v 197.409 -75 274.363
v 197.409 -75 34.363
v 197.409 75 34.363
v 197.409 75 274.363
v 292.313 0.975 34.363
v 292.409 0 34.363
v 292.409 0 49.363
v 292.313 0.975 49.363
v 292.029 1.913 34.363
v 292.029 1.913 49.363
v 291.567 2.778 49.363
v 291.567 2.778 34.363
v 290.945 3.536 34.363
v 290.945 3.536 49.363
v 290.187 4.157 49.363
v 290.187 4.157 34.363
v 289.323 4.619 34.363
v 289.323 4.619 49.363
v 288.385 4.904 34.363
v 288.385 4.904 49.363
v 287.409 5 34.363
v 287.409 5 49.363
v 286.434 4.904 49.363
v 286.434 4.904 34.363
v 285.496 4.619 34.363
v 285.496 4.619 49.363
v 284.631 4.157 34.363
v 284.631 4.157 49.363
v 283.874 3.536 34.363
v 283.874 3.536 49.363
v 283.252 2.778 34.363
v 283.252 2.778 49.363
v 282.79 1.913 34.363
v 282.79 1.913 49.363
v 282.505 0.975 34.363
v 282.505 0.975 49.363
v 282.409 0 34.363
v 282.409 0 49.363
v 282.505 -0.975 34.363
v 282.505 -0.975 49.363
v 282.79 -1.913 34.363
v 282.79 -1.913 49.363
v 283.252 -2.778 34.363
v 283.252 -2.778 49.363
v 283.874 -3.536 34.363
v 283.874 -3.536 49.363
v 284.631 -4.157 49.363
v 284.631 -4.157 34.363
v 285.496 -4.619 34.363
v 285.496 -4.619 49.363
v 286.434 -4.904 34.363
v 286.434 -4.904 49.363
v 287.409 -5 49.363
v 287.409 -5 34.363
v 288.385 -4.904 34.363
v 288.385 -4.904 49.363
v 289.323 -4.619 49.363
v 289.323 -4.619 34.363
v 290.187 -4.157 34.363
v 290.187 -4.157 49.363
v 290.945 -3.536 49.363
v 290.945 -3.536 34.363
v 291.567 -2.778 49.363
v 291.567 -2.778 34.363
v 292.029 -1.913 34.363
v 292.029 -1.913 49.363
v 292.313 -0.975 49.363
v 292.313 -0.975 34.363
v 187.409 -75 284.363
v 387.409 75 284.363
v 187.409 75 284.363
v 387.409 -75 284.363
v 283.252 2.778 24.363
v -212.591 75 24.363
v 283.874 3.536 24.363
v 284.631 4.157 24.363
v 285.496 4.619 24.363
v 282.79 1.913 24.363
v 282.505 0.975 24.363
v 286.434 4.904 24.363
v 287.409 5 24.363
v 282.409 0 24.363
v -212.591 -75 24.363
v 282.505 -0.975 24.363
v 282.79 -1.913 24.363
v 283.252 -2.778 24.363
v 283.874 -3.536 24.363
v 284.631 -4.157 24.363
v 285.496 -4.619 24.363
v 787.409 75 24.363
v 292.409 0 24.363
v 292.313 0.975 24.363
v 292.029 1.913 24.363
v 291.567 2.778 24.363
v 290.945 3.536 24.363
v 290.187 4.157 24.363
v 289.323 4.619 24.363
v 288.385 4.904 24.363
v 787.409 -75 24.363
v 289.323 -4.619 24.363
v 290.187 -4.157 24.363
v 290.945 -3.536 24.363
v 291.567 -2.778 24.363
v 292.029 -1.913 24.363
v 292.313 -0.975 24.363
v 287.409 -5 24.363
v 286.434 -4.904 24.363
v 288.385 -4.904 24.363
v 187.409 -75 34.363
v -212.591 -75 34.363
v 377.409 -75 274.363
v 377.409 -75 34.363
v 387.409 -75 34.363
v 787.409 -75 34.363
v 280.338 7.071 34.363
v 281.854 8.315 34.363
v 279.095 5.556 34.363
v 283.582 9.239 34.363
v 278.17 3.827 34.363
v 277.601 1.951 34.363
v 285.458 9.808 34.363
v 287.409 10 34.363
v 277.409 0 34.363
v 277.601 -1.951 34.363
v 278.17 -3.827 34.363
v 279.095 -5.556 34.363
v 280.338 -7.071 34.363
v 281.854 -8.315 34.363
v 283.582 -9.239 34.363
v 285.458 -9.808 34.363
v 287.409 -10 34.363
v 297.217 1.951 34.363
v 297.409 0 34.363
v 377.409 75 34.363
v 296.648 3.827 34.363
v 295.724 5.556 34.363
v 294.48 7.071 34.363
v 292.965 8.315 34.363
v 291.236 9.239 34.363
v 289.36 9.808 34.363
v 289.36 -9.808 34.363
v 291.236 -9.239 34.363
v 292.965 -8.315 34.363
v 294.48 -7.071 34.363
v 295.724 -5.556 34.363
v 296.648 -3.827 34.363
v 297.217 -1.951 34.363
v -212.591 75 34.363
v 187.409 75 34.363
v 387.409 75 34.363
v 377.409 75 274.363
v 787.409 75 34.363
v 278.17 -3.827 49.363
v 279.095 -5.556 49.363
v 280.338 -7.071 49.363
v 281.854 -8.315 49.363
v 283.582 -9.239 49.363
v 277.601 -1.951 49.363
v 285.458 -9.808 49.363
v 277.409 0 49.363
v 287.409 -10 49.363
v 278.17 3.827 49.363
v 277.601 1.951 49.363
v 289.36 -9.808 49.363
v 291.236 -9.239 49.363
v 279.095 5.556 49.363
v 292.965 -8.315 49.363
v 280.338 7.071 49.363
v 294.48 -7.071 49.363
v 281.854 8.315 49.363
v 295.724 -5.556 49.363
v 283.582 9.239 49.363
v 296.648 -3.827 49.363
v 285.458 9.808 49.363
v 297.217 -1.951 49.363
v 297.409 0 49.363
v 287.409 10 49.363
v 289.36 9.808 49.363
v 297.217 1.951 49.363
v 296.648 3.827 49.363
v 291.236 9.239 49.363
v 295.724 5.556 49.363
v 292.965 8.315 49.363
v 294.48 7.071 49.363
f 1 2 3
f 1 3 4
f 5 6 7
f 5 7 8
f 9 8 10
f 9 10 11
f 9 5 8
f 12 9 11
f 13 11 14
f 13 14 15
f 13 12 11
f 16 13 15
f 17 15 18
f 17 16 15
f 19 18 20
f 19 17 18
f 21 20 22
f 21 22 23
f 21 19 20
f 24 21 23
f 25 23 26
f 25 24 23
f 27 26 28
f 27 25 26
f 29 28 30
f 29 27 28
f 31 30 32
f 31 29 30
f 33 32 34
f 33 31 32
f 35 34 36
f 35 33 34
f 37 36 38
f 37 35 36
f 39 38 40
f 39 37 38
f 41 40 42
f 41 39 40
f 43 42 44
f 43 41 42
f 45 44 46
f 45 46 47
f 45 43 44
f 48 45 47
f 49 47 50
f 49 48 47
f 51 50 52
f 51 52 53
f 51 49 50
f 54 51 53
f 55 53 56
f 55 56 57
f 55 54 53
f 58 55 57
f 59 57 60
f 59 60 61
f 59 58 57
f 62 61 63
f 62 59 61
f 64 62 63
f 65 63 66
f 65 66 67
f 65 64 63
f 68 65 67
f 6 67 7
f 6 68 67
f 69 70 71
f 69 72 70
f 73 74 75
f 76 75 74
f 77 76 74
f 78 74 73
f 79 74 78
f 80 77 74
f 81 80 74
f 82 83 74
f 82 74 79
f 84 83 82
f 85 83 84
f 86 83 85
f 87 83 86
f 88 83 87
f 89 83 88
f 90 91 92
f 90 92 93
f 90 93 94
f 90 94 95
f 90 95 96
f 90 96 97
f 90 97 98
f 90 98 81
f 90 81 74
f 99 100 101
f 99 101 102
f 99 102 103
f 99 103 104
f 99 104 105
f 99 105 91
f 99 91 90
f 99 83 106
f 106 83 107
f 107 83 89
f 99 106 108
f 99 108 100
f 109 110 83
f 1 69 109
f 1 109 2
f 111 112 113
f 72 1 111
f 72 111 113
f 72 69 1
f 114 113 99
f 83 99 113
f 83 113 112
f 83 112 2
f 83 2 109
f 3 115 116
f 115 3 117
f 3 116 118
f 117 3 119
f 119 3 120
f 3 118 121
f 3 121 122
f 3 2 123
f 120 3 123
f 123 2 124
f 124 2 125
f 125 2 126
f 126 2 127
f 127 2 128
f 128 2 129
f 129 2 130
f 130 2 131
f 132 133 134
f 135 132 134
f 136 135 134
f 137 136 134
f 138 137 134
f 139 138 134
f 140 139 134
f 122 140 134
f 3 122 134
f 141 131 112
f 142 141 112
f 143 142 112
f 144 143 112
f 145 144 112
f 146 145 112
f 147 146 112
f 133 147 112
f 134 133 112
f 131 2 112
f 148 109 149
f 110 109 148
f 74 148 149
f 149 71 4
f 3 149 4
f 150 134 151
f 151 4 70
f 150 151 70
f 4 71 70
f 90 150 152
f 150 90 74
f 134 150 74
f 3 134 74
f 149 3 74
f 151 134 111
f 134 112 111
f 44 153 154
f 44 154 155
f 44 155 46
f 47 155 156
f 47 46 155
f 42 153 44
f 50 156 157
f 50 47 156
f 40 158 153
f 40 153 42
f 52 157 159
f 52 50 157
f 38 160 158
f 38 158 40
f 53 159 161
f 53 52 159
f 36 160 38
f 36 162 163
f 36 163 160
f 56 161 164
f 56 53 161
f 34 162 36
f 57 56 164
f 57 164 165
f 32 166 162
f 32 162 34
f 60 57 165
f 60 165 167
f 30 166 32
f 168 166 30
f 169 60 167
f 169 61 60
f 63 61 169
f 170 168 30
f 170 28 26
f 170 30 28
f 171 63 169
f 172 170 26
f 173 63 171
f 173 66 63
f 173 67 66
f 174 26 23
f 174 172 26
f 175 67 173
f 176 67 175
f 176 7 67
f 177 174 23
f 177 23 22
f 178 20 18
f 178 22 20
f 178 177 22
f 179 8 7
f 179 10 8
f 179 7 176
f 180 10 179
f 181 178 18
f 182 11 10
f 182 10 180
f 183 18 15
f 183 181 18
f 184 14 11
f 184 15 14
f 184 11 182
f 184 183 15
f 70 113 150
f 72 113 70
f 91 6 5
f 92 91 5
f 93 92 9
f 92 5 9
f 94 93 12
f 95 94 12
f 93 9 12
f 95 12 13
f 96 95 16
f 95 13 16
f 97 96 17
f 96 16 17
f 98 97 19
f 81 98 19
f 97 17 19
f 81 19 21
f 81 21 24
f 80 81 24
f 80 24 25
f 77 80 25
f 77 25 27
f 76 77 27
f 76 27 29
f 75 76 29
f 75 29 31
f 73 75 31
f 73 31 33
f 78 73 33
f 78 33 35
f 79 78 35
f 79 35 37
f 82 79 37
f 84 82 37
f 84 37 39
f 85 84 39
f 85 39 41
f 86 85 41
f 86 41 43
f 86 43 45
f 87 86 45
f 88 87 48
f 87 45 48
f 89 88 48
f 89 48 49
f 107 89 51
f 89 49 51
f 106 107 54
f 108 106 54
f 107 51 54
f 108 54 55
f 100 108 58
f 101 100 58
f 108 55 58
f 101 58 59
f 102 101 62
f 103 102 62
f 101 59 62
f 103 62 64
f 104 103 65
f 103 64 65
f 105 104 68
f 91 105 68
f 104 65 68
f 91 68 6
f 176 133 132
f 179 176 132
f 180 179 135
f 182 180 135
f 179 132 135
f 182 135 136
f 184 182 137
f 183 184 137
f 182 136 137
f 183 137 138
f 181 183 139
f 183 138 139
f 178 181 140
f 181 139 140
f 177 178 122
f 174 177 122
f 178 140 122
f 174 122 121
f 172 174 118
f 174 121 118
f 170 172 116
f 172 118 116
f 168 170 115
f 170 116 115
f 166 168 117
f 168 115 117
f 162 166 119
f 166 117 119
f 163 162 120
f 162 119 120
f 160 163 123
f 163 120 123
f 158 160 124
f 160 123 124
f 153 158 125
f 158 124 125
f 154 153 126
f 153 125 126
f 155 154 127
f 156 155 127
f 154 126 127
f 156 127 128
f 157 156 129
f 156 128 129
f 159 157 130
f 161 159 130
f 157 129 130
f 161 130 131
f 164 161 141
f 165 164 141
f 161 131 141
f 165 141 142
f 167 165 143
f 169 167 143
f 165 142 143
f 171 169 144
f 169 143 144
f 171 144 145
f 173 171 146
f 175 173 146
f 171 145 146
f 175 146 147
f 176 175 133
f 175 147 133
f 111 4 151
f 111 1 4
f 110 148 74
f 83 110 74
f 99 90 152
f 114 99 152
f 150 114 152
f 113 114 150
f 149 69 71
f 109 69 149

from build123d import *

# Parameters (mm, degrees)
F0_W     = 180
F0_H     = 240
F1_DEPTH = 75
F3_D     = 10
F3_DEPTH = 600
F3_TIP   = 3.0043030951
F2_R     = 10
F2_R_2   = 5
F4_DEPTH = 15


with BuildPart() as f1:
    # F0 (on Front) → F1 (new body, symmetric)
    with BuildSketch(Plane.XZ):
        Polygon((387.4092161655, 284.3629608303), (187.4092161655, 284.3629608303), (187.4092161655, 34.3629608303), (-212.5907838345, 34.3629608303), (-212.5907838345, 24.3629608303), (787.4092161655, 24.3629608303), (787.4092161655, 34.3629608303), (387.4092161655, 34.3629608303), align=None)
        with Locations((287.4092161655, 154.3629608303)):
            Rectangle(F0_W, F0_H, mode=Mode.SUBTRACT)
    extrude(amount=F1_DEPTH, both=True)

    # F3 (one way)
    with BuildSketch(Plane.XY.offset(34.3629608303)):
        with Locations((287.4092161655, 0)):
            Circle(F3_D / 2)
    extrude(amount=-F3_DEPTH, mode=Mode.SUBTRACT)
    with Locations(Plane.XY.offset(34.3629608303)):
        with Locations((287.4092161655, 0)):
            with Locations((0, 0, -(F3_DEPTH + F3_TIP / 2))):  # 118° drill point
                Cone(0, F3_D / 2, F3_TIP, mode=Mode.SUBTRACT)

    # F2 (on face) → F4 (join)
    with BuildSketch(Plane.XY.offset(34.3629608303)):
        with Locations((287.4092161655, 0)):
            Circle(F2_R)
        with Locations((287.4092161655, 0)):
            Circle(F2_R_2, mode=Mode.SUBTRACT)
    extrude(amount=F4_DEPTH)


solid = f1.part
